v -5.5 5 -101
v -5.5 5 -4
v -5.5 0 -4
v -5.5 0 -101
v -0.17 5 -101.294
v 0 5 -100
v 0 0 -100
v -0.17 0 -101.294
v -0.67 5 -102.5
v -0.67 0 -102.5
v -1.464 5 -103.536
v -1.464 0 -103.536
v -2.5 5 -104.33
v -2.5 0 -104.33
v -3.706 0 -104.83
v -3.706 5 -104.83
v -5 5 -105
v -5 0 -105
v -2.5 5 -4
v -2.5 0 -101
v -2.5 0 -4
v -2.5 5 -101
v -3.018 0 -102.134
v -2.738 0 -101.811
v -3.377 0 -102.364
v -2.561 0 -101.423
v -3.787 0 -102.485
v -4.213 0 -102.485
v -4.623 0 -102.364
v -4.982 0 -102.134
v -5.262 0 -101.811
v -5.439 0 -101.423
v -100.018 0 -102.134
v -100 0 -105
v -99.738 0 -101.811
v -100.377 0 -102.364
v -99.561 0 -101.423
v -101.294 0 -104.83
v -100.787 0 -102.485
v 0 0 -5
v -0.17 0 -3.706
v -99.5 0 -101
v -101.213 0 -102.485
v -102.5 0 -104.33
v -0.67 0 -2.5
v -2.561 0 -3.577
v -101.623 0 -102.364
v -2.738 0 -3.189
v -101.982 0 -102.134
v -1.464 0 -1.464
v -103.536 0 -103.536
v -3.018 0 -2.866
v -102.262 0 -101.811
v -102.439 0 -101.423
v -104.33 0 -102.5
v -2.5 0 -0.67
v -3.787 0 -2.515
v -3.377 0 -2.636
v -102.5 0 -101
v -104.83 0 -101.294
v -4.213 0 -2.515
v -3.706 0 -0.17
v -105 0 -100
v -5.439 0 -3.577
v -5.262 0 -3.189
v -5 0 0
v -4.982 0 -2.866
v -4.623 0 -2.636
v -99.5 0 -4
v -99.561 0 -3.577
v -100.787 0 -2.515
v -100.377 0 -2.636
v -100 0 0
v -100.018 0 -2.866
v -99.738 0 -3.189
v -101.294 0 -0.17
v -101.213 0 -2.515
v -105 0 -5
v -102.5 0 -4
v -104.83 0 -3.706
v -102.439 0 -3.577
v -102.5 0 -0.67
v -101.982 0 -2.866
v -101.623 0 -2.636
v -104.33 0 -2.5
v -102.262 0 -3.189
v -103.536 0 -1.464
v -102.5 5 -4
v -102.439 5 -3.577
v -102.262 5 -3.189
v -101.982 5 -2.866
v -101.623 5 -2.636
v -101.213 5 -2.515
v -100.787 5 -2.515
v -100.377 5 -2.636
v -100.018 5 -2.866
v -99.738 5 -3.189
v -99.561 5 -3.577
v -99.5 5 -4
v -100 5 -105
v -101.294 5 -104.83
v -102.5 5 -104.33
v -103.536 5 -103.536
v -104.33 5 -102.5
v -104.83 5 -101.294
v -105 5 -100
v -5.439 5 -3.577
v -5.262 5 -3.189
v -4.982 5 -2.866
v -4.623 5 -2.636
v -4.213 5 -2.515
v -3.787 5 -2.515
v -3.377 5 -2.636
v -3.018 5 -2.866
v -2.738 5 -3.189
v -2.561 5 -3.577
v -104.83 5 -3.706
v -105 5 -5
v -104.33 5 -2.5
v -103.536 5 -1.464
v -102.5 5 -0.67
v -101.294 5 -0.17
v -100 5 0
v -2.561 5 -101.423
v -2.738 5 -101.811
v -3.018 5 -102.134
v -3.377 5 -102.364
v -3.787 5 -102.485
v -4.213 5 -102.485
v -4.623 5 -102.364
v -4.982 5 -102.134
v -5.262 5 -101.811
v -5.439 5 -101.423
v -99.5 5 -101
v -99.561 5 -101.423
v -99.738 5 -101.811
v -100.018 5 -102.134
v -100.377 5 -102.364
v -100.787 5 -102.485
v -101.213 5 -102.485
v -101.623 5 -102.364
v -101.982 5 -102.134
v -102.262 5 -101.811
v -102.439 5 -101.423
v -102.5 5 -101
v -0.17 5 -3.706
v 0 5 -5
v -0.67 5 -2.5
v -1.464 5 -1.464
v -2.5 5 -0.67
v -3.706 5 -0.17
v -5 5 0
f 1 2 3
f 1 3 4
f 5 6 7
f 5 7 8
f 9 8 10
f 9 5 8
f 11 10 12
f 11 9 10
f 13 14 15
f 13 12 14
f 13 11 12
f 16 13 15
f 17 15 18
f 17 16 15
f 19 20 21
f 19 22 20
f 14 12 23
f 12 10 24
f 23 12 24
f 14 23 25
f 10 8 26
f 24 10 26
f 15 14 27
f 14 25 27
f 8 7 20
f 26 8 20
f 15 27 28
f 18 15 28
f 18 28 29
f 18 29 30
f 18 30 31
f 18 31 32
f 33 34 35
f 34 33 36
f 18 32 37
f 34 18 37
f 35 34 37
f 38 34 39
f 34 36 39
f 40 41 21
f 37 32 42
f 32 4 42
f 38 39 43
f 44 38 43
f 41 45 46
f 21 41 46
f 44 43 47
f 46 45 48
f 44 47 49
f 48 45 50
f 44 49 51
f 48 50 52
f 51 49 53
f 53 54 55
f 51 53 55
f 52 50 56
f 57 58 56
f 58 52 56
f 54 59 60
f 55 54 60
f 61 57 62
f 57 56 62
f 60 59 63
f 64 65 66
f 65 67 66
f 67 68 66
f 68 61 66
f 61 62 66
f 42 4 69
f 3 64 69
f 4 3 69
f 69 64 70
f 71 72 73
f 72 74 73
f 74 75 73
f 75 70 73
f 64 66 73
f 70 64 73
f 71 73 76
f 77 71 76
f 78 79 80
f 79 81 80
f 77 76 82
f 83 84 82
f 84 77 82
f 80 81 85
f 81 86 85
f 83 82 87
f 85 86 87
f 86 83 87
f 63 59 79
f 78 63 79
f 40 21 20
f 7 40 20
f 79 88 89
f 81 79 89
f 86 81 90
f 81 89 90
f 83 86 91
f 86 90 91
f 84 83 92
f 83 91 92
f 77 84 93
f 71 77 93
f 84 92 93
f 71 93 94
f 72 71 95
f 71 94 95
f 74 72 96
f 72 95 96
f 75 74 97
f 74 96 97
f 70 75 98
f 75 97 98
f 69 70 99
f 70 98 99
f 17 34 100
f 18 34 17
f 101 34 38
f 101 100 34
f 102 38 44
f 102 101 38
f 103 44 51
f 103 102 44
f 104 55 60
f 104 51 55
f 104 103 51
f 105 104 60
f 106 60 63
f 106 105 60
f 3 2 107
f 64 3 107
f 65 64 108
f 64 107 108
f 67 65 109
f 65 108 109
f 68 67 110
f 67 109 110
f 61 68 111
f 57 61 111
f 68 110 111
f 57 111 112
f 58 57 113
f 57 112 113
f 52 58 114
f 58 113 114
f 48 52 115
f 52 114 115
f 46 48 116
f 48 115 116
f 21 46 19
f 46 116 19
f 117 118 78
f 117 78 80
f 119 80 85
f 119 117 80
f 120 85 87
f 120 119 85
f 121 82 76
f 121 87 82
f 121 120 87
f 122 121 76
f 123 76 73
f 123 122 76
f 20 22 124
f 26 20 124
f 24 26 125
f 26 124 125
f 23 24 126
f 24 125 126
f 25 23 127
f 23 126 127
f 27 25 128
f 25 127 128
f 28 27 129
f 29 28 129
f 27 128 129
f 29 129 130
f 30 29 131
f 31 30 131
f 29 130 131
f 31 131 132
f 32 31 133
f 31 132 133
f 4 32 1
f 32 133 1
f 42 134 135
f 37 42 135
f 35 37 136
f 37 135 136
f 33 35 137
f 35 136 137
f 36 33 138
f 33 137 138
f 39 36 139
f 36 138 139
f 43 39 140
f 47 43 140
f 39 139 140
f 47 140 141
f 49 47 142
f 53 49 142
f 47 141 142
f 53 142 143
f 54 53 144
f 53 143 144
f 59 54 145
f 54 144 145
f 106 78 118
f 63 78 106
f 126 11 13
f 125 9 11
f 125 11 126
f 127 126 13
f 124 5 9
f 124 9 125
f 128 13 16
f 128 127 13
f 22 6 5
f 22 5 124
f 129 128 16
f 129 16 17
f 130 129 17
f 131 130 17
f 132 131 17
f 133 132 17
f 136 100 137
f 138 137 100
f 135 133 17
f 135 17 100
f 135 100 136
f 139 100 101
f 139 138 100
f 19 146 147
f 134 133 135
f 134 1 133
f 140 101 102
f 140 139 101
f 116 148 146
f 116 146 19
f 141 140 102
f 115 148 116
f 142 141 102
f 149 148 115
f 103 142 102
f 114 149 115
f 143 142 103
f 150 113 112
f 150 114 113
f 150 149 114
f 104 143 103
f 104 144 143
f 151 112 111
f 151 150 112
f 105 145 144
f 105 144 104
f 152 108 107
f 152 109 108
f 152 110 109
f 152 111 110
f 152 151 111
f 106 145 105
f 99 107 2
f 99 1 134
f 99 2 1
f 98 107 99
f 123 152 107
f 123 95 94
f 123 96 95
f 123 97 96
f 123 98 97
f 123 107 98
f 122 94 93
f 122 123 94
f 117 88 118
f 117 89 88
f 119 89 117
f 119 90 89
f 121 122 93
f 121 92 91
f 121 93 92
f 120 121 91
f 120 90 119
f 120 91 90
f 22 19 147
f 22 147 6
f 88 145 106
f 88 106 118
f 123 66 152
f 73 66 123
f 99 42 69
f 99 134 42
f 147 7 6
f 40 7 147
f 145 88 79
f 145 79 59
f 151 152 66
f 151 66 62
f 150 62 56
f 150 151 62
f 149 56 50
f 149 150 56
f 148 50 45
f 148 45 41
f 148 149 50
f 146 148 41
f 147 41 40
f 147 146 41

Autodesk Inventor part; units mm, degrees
ref_plane "YZ Plane" through (0, 0, 0) normal (1, 0, 0) x (0, 1, 0)
ref_plane "XZ Plane" through (0, 0, 0) normal (0, 1, 0) x (-1, 0, 0)
sketch "Sketch1" plane through (0, 0, 0) normal (0, 1, 0) x (-1, 0, 0)
  line L0 (0, 0) -> (105, 0)
  line L1 (105, 0) -> (105, -105)
  line L2 (105, -105) -> (0, -105)
  line L3 (0, -105) -> (0, 0)
  dimension "d0" = 105
  dimension "d1" = 105
extrude "Extrusion1" add sketch "Sketch1" along normal blind 5
fillet "Fillet1" radius 5 4 edges at (-105, 2.5, -105) (0, 2.5, 0) (0, 2.5, -105) (-105, 2.5, 0)
sketch "Sketch3" plane through (0, 5, 0) normal (0, 1, 0) x (1, 0, 0)
  line L0 (-102.5, 102.5) -> (-2.5, 102.5) construction
  line L1 (-2.5, 102.5) -> (-2.5, 2.5) construction
  line L2 (-2.5, 2.5) -> (-102.5, 2.5) construction
  line L3 (-102.5, 2.5) -> (-102.5, 102.5) construction
  line L4 (0, 5) -> (0, 100) projected
  line L5 (-5, 105) -> (-100, 105) projected
  line L6 (-105, 100) -> (-105, 5) projected
  line L7 (-100, 0) -> (-5, 0) projected
  point P0 (0, 0)
  dimension "d11" = 2.5
  dimension "d12" = 2.5
  dimension "d13" = 2.5
  dimension "d14" = 2.5
sketch "Sketch4" plane through (0, 5, 0) normal (0, 1, 0) x (1, 0, 0)
  line L0 (-101, 101) -> (-4, 101) construction
  line L1 (-4, 101) -> (-4, 4) construction
  line L2 (-4, 4) -> (-101, 4) construction
  line L3 (-101, 4) -> (-101, 101) construction
  line L4 (0, 5) -> (0, 100) projected
  line L5 (-105, 100) -> (-105, 5) projected
  line L6 (-100, 0) -> (-5, 0) projected
  line L7 (-5, 105) -> (-100, 105) projected
  circle A0 centre (-101, 101) radius 1.5
  circle A1 centre (-4, 101) radius 1.5
  circle A2 centre (-4, 4) radius 1.5
  circle A3 centre (-101, 4) radius 1.5
  point P0 (0, 0)
  dimension "d15" = 4
  dimension "d16" = 4
  dimension "d17" = 4
  dimension "d18" = 4
  dimension "d19" = 3
  dimension "d20" = 3
  dimension "d21" = 3
  dimension "d22" = 3
extrude "Extrusion3" cut sketch "Sketch4" against normal blind 10
sketch "Sketch5" plane through (0, 5, 0) normal (0, 1, 0) x (1, 0, 0)
  circle A0 centre (-4, 4) radius 1.5 projected
  line L0 (-5.5, 4) -> (-5.5, 101)
  circle A1 centre (-4, 101) radius 1.5 projected
  line L1 (-2.5, 101) -> (-2.5, 4)
  circle A2 centre (-101, 4) radius 1.5 projected
  circle A3 centre (-101, 101) radius 1.5 projected
  point P0 (0, 0)
extrude "Extrusion4" cut sketch "Sketch5" against normal blind 10 contours A0 | A0 L0 A1 L1 | A1
ref_plane "Work Plane1" through (-52.5, 0, -5) normal (1, 0, 0) x (0, 0, -1)
mirror "Mirror1" about plane through (-52.5, 0, -5) normal (1, 0, 0) of "Extrusion4"
properties part number "Adult fly trap top and bottom"
